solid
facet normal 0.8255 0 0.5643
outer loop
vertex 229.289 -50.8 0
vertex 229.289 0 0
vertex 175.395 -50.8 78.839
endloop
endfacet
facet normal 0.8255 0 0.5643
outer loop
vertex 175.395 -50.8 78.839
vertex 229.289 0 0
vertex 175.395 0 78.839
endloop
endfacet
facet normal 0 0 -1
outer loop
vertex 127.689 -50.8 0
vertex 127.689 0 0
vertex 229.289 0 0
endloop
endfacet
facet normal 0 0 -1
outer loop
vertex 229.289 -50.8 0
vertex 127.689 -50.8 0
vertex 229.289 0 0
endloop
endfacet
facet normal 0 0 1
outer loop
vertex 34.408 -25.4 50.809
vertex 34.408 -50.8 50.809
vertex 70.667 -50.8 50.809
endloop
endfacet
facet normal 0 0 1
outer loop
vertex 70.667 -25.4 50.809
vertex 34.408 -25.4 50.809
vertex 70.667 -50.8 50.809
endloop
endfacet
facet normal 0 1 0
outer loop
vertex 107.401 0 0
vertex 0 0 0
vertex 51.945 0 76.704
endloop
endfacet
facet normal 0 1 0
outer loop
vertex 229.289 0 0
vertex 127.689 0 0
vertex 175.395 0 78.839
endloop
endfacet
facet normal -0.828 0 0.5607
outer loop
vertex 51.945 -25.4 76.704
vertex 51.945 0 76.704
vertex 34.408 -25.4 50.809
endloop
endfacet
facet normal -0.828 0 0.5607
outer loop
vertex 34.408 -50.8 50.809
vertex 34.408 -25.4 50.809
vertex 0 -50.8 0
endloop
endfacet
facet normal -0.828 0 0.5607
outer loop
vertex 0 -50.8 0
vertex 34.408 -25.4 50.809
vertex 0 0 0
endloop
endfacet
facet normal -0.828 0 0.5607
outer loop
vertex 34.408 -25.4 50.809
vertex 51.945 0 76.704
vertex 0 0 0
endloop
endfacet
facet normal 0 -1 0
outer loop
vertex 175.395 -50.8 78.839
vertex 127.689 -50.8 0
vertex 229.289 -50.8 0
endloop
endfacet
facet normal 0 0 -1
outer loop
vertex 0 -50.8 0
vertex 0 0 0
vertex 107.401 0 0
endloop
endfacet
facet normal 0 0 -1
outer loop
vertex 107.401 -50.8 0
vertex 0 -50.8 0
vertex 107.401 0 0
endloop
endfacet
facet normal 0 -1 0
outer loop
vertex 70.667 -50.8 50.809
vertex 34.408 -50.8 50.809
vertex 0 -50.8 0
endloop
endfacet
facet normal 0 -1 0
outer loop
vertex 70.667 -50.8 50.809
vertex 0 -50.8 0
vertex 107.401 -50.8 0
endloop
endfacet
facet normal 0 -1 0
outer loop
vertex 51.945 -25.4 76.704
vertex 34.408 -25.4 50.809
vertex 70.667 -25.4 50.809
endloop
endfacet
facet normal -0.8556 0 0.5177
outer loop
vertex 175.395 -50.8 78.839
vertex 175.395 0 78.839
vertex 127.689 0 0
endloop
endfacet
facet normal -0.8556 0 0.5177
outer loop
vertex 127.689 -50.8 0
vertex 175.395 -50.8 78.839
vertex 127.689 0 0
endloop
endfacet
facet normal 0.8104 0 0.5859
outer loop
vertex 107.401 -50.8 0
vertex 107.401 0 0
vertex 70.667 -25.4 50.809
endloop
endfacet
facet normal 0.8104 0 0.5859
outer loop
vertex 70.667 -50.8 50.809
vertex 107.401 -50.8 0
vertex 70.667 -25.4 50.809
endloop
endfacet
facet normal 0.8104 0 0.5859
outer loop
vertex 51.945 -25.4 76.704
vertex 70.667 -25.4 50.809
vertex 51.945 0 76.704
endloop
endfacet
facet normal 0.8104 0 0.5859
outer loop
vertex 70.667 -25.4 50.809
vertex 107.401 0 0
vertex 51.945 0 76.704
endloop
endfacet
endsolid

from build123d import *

# Parameters (mm, degrees)
F1_DEPTH = 50.8
F3_DEPTH = 25.4
F5_DEPTH = 50.8


with BuildPart() as f1:
    # F0 (on Front) → F1 (new body)
    with BuildSketch(Plane.XZ):
        Polygon((51.9446469843, 76.7036750913), (0, 0), (107.4013710022, 0), align=None)
    extrude(amount=F1_DEPTH)

    # F2 (on face) → F3 (cut)
    with BuildSketch(Plane.XZ.offset(50.8)):
        Polygon((51.9446469843, 76.7036750913), (34.4084353838, 50.8089591767), (70.6665154253, 50.8089591767), align=None)
    extrude(amount=-F3_DEPTH, mode=Mode.SUBTRACT)


with BuildPart() as f5:
    # F4 (on Front) → F5 (new body)
    with BuildSketch(Plane.XZ):
        Polygon((175.3951609135, 78.8389742374), (127.6893019676, 0), (229.2893019676, 0), align=None)
    extrude(amount=F5_DEPTH)


solid = Compound([f1.part, f5.part])
